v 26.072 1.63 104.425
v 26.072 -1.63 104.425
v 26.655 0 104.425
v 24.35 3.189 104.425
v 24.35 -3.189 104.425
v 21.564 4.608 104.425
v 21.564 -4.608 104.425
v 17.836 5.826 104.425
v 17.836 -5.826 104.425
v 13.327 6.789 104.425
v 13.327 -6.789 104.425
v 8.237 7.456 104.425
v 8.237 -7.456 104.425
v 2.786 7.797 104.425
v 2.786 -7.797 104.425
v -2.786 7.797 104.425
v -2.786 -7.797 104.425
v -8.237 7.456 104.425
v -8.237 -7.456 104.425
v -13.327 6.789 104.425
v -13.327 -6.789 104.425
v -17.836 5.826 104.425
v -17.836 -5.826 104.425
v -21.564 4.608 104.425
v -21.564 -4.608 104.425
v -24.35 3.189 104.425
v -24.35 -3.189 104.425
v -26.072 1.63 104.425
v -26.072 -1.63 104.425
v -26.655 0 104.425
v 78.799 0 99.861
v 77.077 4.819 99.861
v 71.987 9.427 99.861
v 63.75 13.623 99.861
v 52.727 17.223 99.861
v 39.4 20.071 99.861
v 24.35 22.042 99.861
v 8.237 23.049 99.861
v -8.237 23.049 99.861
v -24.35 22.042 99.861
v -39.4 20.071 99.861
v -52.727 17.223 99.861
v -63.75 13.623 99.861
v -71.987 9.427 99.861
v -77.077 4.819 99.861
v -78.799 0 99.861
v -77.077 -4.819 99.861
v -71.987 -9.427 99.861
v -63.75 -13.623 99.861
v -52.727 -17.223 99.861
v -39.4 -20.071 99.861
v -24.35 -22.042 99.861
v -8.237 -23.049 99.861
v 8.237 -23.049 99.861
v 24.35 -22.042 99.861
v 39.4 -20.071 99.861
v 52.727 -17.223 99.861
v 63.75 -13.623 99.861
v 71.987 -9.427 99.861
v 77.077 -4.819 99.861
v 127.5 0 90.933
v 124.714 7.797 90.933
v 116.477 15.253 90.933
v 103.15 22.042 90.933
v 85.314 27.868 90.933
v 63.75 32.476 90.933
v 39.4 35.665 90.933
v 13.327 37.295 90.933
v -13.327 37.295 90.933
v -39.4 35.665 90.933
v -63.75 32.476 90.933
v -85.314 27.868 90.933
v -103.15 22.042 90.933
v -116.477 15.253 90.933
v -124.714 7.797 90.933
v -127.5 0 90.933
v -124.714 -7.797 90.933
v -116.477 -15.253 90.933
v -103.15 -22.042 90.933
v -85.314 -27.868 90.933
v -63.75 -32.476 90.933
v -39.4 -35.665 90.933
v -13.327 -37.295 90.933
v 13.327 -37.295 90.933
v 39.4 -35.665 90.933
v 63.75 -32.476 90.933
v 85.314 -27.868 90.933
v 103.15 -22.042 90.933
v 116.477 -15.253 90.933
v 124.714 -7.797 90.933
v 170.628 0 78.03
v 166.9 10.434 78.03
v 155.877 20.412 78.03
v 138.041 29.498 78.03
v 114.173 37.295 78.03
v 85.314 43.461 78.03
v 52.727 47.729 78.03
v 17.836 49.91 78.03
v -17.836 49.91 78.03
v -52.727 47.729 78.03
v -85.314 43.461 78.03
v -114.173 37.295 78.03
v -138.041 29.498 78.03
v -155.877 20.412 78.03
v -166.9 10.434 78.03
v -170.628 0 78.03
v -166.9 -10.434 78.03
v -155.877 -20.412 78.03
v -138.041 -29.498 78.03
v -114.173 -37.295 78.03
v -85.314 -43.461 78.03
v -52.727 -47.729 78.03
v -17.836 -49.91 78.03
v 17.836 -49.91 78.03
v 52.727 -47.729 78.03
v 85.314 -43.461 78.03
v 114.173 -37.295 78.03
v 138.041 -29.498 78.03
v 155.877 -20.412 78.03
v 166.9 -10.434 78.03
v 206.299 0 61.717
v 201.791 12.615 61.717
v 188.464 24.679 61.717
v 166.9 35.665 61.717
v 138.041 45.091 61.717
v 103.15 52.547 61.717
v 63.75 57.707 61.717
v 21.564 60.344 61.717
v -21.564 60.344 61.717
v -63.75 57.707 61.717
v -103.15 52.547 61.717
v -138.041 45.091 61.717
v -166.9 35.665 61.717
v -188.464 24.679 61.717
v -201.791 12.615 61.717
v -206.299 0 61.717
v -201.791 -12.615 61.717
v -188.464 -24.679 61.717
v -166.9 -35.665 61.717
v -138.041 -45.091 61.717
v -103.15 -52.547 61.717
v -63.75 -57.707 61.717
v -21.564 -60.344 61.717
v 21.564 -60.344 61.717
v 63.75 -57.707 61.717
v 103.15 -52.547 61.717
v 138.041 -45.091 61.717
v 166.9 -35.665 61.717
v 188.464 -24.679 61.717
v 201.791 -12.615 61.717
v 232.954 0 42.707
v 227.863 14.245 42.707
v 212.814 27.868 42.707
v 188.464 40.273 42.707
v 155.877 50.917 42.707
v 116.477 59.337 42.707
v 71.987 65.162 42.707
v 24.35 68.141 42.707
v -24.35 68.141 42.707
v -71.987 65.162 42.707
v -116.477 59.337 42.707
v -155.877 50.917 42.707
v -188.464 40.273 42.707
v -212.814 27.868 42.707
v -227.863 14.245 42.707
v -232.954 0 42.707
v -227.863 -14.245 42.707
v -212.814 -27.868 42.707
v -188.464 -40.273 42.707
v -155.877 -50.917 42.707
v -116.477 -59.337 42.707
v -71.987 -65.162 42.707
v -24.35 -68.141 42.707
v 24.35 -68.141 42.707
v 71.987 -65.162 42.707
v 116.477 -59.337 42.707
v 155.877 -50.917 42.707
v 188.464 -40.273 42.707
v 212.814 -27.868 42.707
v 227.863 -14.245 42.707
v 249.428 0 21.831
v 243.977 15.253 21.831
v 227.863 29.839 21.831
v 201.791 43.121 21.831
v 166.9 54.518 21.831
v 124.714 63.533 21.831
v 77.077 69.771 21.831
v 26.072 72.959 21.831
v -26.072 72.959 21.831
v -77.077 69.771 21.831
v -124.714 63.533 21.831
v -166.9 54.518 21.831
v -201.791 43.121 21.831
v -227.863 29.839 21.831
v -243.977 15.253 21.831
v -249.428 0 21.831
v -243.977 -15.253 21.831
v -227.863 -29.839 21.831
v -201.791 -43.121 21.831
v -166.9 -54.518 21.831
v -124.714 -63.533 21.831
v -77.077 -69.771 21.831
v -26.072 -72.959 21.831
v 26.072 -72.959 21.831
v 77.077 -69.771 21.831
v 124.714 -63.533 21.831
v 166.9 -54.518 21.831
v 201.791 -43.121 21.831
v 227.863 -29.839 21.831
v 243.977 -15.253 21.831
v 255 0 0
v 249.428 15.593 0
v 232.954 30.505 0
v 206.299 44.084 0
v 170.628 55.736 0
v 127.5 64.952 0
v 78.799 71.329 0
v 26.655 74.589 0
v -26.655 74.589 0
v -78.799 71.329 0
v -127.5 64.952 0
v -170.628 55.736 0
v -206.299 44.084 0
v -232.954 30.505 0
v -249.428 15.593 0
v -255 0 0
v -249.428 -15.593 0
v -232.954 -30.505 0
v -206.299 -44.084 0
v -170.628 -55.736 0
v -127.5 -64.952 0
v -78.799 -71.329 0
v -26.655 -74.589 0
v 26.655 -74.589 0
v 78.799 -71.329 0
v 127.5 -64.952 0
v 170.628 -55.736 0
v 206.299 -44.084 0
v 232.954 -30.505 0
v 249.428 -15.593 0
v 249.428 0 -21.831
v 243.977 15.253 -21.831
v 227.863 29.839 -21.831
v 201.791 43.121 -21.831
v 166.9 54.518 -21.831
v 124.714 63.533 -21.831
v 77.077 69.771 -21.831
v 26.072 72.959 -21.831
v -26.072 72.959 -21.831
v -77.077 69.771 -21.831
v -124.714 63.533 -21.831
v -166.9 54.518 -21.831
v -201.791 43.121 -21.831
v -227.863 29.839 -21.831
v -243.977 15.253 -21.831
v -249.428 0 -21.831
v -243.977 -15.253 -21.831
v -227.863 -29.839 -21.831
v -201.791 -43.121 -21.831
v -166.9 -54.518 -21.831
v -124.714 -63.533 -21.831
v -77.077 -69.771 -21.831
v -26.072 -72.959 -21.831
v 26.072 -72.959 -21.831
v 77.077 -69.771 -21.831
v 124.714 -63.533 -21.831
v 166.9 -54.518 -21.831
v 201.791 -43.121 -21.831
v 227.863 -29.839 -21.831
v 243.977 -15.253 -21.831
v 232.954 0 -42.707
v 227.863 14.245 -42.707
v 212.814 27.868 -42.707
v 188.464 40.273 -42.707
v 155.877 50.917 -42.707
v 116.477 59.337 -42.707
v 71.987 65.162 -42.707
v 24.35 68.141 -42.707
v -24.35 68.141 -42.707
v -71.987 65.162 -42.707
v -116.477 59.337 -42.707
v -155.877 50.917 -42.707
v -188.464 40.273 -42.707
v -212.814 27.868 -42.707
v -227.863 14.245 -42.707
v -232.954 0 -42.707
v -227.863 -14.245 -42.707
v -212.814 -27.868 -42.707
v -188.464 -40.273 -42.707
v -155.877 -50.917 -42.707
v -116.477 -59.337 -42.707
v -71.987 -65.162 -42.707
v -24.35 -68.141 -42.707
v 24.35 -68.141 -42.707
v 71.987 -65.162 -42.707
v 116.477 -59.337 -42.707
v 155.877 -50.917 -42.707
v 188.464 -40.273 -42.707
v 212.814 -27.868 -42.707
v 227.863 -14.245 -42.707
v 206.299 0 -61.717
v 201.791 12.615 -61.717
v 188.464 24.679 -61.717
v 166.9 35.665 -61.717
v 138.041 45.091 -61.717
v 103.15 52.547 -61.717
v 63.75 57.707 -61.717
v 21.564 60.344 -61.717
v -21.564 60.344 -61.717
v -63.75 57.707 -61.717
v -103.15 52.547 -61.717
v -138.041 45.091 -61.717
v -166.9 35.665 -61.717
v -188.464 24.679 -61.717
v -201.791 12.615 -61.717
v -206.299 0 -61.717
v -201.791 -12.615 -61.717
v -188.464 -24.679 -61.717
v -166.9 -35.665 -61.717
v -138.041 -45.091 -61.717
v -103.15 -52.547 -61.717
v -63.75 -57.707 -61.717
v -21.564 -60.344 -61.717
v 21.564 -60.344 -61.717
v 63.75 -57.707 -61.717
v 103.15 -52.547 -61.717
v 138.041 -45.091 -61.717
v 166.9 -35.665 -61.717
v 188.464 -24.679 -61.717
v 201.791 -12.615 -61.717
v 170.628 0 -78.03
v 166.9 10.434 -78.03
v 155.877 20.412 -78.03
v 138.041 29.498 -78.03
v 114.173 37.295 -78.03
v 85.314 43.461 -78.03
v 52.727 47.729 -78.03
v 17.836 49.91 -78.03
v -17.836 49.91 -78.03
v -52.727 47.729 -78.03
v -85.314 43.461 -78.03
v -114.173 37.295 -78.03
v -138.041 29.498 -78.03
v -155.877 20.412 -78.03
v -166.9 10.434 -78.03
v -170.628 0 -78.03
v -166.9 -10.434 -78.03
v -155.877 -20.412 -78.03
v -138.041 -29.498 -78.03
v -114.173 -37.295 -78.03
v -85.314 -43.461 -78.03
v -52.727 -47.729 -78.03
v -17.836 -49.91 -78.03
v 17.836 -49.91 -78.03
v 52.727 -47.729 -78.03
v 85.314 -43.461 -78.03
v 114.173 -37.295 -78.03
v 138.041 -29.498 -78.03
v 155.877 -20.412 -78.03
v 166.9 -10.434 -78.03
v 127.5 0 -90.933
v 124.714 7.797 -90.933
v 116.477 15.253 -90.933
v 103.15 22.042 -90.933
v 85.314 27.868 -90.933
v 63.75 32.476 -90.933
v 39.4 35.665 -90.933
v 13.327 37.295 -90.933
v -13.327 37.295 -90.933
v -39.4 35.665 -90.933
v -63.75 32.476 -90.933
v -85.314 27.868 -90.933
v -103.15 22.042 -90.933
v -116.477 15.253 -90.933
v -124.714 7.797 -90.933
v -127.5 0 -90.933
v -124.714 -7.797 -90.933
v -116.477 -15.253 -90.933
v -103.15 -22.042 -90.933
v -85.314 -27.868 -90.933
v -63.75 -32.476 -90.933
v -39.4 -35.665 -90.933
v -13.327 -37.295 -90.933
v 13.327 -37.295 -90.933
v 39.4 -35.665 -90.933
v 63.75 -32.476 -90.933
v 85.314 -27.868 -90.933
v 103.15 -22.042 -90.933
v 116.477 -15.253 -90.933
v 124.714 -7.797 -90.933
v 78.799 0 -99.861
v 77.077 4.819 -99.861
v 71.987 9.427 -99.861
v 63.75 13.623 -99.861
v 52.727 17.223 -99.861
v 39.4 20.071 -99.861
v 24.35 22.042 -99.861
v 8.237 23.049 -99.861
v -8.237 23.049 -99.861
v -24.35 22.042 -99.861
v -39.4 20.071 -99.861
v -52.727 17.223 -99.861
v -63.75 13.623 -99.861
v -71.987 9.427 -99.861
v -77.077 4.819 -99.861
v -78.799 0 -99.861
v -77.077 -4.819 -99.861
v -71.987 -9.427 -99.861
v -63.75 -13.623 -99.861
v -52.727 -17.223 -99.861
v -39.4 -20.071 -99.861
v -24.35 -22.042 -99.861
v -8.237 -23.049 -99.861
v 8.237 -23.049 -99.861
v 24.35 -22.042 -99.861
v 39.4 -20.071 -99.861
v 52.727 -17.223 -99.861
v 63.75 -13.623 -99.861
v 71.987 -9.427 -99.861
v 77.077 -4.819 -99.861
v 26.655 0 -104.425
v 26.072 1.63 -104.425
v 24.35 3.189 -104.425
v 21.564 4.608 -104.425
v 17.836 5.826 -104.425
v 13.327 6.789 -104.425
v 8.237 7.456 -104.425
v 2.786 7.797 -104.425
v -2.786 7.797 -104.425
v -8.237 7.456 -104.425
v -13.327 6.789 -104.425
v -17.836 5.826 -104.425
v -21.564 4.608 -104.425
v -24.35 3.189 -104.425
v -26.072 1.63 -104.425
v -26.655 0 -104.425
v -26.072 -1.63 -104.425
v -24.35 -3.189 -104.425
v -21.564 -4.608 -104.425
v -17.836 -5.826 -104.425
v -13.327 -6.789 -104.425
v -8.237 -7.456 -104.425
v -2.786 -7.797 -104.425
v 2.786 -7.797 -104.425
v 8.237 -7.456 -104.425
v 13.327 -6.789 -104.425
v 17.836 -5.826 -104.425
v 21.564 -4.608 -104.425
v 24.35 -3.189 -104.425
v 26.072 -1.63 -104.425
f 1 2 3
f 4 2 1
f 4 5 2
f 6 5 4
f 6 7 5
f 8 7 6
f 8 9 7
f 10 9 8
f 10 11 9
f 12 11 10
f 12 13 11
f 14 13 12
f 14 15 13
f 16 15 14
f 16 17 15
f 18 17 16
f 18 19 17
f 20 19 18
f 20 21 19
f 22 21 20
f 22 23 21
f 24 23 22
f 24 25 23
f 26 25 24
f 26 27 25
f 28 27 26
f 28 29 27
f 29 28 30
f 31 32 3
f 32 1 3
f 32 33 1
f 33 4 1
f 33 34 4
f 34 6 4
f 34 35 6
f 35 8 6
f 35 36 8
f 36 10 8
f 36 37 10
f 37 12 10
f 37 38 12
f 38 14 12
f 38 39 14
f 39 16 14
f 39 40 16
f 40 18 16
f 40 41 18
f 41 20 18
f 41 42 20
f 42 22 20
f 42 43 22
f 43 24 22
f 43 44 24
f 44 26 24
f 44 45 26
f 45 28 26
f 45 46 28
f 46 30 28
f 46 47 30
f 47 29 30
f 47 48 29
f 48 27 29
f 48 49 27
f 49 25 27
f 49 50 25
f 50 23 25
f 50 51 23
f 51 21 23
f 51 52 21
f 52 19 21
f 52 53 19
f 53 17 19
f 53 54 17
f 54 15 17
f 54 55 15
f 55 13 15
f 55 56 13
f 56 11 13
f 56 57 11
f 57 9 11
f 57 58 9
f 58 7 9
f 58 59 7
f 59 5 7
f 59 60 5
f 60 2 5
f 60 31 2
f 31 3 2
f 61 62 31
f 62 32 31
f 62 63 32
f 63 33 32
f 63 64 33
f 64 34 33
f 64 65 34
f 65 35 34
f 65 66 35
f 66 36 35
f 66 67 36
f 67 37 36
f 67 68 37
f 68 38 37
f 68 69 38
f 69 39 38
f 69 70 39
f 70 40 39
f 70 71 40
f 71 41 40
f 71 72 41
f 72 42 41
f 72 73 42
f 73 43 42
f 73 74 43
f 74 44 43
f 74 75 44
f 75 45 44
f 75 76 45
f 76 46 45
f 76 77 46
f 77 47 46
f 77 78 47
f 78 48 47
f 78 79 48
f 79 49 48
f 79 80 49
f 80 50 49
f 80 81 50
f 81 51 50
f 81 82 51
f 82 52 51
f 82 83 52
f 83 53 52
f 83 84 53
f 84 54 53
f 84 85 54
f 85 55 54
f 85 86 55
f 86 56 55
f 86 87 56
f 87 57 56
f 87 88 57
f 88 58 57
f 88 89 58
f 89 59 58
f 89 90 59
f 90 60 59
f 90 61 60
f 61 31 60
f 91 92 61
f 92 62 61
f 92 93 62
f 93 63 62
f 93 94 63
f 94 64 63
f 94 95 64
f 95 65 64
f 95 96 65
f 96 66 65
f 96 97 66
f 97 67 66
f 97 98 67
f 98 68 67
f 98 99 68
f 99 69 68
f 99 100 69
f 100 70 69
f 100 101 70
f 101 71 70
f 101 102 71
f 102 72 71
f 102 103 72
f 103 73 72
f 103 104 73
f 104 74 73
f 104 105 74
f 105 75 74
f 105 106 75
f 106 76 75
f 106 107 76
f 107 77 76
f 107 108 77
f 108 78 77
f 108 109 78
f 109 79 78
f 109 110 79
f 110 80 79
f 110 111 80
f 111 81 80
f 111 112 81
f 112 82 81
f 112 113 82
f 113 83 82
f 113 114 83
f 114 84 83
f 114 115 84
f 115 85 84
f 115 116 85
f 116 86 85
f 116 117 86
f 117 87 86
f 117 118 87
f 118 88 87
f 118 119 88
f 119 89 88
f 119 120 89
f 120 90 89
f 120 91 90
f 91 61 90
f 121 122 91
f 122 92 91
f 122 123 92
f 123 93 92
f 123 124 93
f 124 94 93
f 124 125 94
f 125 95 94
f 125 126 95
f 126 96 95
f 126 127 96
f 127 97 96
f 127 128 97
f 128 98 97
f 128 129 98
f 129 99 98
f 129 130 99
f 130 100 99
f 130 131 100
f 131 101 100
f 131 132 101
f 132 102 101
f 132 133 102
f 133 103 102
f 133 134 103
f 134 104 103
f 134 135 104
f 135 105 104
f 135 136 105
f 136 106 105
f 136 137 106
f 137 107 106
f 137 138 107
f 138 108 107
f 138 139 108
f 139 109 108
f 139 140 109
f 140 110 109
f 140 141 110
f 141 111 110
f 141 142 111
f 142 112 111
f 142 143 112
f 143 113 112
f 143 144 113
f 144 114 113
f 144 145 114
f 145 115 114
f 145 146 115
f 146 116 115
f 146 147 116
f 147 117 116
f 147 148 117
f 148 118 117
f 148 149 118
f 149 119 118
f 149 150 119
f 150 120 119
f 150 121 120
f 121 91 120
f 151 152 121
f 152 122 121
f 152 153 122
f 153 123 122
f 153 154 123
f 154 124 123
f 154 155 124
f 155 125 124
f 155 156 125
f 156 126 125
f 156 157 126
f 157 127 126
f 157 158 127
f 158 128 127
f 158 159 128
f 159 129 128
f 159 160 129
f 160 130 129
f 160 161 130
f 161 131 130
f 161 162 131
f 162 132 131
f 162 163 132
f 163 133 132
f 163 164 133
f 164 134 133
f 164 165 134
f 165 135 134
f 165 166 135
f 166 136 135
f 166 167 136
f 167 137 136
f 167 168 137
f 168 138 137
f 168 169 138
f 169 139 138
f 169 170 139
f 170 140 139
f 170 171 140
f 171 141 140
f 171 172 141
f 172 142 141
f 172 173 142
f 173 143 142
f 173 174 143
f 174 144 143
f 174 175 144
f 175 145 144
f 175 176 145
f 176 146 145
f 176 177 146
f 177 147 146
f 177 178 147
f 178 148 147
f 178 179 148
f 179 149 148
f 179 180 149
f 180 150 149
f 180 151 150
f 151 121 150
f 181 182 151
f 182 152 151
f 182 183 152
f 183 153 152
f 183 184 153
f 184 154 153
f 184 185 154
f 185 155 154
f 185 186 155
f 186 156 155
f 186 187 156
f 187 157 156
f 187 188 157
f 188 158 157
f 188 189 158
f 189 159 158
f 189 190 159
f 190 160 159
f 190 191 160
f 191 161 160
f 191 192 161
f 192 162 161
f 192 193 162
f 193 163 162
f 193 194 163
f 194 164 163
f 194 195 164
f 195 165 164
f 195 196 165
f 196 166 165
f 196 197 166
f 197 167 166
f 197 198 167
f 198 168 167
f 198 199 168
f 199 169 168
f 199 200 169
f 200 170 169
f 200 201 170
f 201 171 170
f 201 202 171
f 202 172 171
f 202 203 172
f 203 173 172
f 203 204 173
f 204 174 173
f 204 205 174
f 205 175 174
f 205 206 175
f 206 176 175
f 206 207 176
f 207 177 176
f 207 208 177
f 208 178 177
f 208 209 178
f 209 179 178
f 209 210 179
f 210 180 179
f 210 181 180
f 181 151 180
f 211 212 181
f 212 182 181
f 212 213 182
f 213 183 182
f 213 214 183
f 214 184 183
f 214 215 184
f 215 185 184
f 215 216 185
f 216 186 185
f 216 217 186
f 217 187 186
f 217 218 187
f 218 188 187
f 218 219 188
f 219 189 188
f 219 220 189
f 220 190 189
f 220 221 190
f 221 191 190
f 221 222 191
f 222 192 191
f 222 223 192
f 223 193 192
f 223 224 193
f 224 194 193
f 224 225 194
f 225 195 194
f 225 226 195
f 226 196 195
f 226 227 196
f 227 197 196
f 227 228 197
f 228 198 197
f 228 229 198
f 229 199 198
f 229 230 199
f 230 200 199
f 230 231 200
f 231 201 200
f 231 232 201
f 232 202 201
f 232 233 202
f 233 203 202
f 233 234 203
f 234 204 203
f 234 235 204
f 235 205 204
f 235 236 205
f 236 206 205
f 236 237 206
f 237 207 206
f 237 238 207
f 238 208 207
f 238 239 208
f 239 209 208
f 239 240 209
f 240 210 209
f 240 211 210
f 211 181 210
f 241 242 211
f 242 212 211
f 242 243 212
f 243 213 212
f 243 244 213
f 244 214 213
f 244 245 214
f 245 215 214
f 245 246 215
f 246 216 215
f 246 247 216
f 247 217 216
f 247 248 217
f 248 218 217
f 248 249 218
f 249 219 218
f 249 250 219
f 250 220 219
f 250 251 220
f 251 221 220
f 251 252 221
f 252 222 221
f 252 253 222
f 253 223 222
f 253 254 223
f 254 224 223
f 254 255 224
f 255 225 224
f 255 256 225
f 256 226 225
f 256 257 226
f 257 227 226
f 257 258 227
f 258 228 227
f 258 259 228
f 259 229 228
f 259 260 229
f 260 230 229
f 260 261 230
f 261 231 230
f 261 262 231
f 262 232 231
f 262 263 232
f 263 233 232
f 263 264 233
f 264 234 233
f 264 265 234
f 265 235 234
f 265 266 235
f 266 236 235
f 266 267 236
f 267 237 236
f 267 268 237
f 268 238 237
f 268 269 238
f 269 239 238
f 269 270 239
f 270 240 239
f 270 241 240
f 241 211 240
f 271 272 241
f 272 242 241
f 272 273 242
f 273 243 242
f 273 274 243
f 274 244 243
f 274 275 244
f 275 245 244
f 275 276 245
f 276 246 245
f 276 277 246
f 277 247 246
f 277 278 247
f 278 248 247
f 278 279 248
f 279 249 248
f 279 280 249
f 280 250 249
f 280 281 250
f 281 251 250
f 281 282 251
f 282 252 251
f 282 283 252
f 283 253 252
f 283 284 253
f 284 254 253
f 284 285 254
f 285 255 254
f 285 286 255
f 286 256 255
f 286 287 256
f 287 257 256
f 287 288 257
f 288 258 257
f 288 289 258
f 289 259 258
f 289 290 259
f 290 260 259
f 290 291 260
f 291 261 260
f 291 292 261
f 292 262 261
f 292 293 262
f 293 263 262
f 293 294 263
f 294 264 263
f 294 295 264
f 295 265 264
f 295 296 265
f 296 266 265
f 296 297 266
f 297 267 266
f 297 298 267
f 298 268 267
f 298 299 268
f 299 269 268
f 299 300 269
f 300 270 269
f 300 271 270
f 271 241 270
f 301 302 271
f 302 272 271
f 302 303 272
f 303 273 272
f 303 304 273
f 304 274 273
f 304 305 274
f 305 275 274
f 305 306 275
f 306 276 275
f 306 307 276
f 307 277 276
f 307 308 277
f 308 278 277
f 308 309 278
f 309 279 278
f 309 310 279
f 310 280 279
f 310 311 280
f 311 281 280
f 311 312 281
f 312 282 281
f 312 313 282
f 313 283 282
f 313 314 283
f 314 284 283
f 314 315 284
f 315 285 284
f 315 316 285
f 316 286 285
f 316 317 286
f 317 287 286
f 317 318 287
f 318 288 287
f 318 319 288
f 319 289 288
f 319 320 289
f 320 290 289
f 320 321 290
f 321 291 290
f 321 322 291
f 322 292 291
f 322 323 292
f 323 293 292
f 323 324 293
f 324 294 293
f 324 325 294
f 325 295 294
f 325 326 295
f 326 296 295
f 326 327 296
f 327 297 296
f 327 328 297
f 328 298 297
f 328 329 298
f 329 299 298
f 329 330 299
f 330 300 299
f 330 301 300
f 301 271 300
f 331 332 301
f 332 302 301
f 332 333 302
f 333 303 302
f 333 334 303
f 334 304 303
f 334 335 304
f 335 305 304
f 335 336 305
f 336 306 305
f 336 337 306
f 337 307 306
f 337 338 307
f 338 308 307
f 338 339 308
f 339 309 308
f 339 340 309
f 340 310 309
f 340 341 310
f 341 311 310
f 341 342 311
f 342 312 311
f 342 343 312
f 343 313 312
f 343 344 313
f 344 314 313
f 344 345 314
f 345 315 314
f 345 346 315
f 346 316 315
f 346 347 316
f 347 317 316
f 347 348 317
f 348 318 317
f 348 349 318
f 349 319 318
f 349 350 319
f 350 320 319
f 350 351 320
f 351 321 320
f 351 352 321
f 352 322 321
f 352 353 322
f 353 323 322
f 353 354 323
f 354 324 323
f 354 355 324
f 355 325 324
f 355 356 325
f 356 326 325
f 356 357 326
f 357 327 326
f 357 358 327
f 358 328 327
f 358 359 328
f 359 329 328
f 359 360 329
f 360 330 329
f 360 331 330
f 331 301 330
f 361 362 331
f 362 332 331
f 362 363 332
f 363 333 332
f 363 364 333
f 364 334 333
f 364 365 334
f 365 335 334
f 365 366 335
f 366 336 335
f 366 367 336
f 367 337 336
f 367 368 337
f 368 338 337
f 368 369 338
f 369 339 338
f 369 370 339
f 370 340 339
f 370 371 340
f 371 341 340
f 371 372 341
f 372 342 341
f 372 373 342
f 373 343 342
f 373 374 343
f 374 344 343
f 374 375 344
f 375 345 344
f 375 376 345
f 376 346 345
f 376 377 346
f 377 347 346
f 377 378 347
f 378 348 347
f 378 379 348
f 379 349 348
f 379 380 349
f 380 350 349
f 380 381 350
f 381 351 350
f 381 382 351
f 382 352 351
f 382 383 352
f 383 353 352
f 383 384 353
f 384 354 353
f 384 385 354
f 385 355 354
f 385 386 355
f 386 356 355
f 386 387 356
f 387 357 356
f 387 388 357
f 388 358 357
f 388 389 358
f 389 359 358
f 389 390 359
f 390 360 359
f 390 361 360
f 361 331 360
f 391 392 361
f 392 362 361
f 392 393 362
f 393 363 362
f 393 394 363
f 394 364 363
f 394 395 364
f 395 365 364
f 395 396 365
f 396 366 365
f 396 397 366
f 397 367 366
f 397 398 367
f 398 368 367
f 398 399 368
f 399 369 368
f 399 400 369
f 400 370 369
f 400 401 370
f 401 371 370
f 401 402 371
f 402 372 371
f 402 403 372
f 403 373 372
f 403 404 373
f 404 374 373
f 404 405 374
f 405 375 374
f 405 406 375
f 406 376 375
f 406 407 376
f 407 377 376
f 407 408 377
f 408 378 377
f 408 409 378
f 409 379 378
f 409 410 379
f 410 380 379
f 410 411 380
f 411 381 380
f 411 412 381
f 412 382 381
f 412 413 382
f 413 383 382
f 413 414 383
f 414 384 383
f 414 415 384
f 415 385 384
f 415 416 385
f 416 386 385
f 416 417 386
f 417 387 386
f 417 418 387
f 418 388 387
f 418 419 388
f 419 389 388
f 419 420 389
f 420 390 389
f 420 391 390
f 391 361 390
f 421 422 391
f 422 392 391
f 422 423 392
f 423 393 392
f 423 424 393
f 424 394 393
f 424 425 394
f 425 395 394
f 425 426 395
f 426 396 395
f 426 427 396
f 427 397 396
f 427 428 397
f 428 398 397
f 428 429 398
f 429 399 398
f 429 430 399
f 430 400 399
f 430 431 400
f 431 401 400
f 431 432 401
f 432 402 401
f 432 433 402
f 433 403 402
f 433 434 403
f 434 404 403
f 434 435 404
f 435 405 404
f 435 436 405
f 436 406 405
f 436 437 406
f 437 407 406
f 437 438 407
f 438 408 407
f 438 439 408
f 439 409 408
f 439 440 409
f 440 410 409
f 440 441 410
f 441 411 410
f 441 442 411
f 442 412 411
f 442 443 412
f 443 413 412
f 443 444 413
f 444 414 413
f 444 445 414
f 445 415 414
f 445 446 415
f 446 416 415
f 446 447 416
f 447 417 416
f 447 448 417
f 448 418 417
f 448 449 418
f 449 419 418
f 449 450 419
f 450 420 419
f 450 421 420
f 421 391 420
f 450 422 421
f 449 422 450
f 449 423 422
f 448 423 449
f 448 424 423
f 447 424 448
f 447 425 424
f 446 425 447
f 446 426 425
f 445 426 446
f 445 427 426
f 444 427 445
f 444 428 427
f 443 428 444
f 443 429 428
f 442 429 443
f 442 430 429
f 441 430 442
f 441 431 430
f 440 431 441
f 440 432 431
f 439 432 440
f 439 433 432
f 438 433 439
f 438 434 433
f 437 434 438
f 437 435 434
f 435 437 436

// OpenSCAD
// Generated by SolidPython 1.0.1 on 2020-07-29 00:46:52


scale(v = [17, 5, 7]) {
	sphere(r = 15);
}
/***********************************************
*********      SolidPython code:      **********
************************************************
 
# import packages: SolidPython
from solid import *
from solid.utils import *
from itertools import chain, combinations, permutations


class Resize:

    def __init__(self, scad_file):
        self.scad_file = scad_file
        #self.scad_file = import_scad(scad_file)
        # cone/cylinder param:
        self.r1 = 0
        self.r2 = 0
        self.h = 0
        # rectangular prism param:
        self.w = 0
        self.l = 0
        # ellipse param:
        self.r = 0

    # import OpenScad code (file name corresponds to shape)


    # classify shape + parameters
    def assign(self, param1, param2, param3):
        if self.scad_file == 'cone.scad':
            self.r1 = param1
            self.r2 = param2
            self.h = param3
        elif self.scad_file == 'cylinder.scad':
            self.r1 = param1
            self.r2 = param2
            self.h = param3
        elif self.scad_file == 'rectangularPrism.scad':
            self.h = param1
            self.l = param2
            self.w = param3
        else:
            self.r = param1
            self.h = param2

    # resize parameters
    def iterate(self):
        x = range(3, 20, 2)
        i = 1
        if self.scad_file == 'cone.scad':
            tempList = list(permutations(x, 2))
            for temp in tempList:
                param1 = temp[0]
                param2 = temp[1]
                filepath = 'produced_scad_files/' + 'cone' + str(param1) + '_' + str(param2) + '_' + '.scad'
                scad_render_to_file(cylinder(h=param1, r1=param2, r2=0), filepath)

        elif self.scad_file == 'cylinder.scad':
            tempList = list(permutations(x, 3))
            for temp in tempList:
                param1 = temp[0]
                param2 = temp[1]
                filepath = 'produced_scad_files/' + 'cylinder' + str(param1) + '_' + str(param2) + '_' + '.scad'
                scad_render_to_file(cylinder(h=param1, r1=param2, r2=param2), filepath)

        elif self.scad_file == 'rectangularPrism.scad':
            tempList = list(permutations(x, 3))
            for temp in tempList:
                param1 = temp[0]
                param2 = temp[1]
                param3 = temp[2]
                filepath = 'produced_scad_files/' + 'rectangularPrism' + str(param1) + '_' + str(param2) + '_' + str(
                    param3) + '.scad'
                scad_render_to_file(cube(size=(param1, param2, param3)), filepath)

        elif self.scad_file == 'ellipse.scad':
            tempList = list(permutations(x, 4))
            for temp in tempList:
                param1 = temp[0]
                param2 = temp[1]
                param3 = temp[2]
                param4 = temp[3]
                filepath = 'produced_scad_files/' + 'ellipse' + str(param1) + '_' + str(param2) + '_' + str(param3) + '_' + str(param4) + '.scad'
                scad_render_to_file(scale([param1, param2, param3])(sphere(r=param4)), filepath)

    def render_to_scadfile(self):
        scad_render_to_file(scad, 'example.scad') 
 
************************************************/
